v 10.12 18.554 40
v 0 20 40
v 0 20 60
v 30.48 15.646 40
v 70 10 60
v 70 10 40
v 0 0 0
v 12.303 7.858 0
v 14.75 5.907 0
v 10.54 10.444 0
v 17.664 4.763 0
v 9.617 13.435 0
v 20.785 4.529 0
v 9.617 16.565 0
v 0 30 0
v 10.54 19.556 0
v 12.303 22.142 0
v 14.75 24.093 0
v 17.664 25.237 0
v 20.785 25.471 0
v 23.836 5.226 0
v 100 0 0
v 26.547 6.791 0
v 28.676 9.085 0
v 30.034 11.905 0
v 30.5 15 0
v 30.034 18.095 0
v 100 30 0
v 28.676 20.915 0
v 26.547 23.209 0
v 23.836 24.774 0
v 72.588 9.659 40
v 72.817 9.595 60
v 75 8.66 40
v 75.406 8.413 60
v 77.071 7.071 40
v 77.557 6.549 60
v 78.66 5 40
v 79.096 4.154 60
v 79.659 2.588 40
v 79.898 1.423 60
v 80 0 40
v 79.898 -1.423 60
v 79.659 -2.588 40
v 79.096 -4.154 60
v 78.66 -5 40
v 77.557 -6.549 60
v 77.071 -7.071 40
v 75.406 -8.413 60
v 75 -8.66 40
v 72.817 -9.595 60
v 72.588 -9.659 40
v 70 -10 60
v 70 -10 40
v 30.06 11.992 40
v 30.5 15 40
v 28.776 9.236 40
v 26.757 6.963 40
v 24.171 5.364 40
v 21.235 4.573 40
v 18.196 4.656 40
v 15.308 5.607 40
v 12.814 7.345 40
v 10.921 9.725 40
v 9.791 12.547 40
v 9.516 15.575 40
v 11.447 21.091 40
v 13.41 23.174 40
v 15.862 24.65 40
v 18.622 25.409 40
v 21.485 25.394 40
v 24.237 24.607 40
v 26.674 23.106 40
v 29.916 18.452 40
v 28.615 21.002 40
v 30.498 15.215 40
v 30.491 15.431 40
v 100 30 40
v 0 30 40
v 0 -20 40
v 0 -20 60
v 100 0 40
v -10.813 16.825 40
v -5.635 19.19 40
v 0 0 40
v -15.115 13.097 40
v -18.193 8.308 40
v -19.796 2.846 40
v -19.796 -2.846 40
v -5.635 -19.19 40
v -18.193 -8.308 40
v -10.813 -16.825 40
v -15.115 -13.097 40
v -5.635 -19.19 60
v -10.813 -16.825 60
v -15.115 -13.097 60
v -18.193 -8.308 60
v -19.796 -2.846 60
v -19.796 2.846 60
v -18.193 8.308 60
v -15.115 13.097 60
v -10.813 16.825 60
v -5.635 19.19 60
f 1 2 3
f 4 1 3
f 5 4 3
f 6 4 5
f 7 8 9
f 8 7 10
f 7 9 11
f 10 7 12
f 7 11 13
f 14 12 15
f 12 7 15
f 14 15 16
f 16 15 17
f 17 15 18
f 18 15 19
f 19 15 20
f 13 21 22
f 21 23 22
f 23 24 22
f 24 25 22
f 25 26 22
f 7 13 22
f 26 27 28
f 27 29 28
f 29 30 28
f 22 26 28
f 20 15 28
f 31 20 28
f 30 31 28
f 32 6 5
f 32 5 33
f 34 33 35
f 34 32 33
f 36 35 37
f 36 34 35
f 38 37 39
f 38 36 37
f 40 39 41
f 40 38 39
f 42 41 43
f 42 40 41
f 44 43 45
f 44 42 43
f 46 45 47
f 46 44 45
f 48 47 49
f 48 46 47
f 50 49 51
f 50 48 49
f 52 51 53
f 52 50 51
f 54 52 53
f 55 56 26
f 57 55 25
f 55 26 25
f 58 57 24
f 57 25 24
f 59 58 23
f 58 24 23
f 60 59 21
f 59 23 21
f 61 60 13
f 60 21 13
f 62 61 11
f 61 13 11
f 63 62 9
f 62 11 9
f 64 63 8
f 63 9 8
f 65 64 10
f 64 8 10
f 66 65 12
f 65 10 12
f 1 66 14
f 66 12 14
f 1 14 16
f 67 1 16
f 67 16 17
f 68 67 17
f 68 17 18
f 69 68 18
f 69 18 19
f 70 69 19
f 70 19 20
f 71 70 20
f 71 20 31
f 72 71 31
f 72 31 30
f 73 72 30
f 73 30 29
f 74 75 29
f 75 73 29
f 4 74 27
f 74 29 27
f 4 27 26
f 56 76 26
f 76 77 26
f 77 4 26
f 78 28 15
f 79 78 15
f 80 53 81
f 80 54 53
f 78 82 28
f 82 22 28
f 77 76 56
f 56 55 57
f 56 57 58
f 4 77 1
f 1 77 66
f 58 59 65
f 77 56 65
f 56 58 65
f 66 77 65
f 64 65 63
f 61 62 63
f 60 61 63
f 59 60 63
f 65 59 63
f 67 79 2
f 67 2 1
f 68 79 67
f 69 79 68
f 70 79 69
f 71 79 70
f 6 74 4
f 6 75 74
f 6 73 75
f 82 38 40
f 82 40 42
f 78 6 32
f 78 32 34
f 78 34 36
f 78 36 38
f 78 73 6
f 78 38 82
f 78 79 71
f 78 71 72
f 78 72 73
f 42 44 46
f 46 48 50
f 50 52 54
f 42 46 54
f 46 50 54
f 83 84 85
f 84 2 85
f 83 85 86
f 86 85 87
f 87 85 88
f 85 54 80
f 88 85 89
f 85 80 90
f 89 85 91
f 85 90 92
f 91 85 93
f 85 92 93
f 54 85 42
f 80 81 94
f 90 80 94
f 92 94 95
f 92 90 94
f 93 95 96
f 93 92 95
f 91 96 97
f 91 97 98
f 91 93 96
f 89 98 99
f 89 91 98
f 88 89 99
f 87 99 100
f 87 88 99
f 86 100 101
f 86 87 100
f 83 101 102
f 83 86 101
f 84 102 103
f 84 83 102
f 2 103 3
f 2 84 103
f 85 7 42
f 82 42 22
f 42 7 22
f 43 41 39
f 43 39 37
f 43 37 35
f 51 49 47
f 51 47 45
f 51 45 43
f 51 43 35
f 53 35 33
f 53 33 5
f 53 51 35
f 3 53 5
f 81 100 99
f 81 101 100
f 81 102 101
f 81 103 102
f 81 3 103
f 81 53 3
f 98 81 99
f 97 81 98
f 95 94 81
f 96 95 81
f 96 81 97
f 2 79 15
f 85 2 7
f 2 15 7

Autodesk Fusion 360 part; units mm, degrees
sketch "Boceto1" plane through (0, 0, 0) normal (0, 0, 1) x (1, 0, 0)
  circle A0 centre (0, 0) radius 10.5
  dimension "d1" = 21
extrude "Extruir1" add sketch "Boceto1" along normal blind 40
sketch "Boceto2" plane through (0, 0, 40) normal (0, 0, 1) x (-1, 0, 0)
  circle A0 centre (0, 0) radius 10.5
  circle A1 centre (0, 0) radius 20
  line L0 (20, 0) -> (-80, 0)
  circle A2 centre (-70, 0) radius 10
  line L1 (0, -20) -> (-70, -10)
  line L2 (-70, 10) -> (0, 20)
  dimension "d4" = 40
  dimension "d5" = 100
extrude "Extruir2" add sketch "Boceto2" along normal blind 20 contours A0 L0 | A0 A1 L0 L1 | A0 A1 L0 L2 | A0 L0 | A1 L0 A2 L2 | A1 L0 A2 L1 | L0 A2 | L0 A2

Autodesk Fusion 360 part; units mm, degrees
sketch "Boceto1" plane through (0, 0, 0) normal (0, 0, 1) x (1, 0, 0)
  line L0 (0, 0) -> (100, 0)
  line L1 (100, 0) -> (100, 30)
  line L2 (100, 30) -> (0, 30)
  line L3 (0, 30) -> (0, 0)
  circle A0 centre (20, 15) radius 10.5
  dimension "d1" = 100
  dimension "d2" = 30
  dimension "d3" = 21
extrude "Extruir1" add sketch "Boceto1" along normal blind 20
